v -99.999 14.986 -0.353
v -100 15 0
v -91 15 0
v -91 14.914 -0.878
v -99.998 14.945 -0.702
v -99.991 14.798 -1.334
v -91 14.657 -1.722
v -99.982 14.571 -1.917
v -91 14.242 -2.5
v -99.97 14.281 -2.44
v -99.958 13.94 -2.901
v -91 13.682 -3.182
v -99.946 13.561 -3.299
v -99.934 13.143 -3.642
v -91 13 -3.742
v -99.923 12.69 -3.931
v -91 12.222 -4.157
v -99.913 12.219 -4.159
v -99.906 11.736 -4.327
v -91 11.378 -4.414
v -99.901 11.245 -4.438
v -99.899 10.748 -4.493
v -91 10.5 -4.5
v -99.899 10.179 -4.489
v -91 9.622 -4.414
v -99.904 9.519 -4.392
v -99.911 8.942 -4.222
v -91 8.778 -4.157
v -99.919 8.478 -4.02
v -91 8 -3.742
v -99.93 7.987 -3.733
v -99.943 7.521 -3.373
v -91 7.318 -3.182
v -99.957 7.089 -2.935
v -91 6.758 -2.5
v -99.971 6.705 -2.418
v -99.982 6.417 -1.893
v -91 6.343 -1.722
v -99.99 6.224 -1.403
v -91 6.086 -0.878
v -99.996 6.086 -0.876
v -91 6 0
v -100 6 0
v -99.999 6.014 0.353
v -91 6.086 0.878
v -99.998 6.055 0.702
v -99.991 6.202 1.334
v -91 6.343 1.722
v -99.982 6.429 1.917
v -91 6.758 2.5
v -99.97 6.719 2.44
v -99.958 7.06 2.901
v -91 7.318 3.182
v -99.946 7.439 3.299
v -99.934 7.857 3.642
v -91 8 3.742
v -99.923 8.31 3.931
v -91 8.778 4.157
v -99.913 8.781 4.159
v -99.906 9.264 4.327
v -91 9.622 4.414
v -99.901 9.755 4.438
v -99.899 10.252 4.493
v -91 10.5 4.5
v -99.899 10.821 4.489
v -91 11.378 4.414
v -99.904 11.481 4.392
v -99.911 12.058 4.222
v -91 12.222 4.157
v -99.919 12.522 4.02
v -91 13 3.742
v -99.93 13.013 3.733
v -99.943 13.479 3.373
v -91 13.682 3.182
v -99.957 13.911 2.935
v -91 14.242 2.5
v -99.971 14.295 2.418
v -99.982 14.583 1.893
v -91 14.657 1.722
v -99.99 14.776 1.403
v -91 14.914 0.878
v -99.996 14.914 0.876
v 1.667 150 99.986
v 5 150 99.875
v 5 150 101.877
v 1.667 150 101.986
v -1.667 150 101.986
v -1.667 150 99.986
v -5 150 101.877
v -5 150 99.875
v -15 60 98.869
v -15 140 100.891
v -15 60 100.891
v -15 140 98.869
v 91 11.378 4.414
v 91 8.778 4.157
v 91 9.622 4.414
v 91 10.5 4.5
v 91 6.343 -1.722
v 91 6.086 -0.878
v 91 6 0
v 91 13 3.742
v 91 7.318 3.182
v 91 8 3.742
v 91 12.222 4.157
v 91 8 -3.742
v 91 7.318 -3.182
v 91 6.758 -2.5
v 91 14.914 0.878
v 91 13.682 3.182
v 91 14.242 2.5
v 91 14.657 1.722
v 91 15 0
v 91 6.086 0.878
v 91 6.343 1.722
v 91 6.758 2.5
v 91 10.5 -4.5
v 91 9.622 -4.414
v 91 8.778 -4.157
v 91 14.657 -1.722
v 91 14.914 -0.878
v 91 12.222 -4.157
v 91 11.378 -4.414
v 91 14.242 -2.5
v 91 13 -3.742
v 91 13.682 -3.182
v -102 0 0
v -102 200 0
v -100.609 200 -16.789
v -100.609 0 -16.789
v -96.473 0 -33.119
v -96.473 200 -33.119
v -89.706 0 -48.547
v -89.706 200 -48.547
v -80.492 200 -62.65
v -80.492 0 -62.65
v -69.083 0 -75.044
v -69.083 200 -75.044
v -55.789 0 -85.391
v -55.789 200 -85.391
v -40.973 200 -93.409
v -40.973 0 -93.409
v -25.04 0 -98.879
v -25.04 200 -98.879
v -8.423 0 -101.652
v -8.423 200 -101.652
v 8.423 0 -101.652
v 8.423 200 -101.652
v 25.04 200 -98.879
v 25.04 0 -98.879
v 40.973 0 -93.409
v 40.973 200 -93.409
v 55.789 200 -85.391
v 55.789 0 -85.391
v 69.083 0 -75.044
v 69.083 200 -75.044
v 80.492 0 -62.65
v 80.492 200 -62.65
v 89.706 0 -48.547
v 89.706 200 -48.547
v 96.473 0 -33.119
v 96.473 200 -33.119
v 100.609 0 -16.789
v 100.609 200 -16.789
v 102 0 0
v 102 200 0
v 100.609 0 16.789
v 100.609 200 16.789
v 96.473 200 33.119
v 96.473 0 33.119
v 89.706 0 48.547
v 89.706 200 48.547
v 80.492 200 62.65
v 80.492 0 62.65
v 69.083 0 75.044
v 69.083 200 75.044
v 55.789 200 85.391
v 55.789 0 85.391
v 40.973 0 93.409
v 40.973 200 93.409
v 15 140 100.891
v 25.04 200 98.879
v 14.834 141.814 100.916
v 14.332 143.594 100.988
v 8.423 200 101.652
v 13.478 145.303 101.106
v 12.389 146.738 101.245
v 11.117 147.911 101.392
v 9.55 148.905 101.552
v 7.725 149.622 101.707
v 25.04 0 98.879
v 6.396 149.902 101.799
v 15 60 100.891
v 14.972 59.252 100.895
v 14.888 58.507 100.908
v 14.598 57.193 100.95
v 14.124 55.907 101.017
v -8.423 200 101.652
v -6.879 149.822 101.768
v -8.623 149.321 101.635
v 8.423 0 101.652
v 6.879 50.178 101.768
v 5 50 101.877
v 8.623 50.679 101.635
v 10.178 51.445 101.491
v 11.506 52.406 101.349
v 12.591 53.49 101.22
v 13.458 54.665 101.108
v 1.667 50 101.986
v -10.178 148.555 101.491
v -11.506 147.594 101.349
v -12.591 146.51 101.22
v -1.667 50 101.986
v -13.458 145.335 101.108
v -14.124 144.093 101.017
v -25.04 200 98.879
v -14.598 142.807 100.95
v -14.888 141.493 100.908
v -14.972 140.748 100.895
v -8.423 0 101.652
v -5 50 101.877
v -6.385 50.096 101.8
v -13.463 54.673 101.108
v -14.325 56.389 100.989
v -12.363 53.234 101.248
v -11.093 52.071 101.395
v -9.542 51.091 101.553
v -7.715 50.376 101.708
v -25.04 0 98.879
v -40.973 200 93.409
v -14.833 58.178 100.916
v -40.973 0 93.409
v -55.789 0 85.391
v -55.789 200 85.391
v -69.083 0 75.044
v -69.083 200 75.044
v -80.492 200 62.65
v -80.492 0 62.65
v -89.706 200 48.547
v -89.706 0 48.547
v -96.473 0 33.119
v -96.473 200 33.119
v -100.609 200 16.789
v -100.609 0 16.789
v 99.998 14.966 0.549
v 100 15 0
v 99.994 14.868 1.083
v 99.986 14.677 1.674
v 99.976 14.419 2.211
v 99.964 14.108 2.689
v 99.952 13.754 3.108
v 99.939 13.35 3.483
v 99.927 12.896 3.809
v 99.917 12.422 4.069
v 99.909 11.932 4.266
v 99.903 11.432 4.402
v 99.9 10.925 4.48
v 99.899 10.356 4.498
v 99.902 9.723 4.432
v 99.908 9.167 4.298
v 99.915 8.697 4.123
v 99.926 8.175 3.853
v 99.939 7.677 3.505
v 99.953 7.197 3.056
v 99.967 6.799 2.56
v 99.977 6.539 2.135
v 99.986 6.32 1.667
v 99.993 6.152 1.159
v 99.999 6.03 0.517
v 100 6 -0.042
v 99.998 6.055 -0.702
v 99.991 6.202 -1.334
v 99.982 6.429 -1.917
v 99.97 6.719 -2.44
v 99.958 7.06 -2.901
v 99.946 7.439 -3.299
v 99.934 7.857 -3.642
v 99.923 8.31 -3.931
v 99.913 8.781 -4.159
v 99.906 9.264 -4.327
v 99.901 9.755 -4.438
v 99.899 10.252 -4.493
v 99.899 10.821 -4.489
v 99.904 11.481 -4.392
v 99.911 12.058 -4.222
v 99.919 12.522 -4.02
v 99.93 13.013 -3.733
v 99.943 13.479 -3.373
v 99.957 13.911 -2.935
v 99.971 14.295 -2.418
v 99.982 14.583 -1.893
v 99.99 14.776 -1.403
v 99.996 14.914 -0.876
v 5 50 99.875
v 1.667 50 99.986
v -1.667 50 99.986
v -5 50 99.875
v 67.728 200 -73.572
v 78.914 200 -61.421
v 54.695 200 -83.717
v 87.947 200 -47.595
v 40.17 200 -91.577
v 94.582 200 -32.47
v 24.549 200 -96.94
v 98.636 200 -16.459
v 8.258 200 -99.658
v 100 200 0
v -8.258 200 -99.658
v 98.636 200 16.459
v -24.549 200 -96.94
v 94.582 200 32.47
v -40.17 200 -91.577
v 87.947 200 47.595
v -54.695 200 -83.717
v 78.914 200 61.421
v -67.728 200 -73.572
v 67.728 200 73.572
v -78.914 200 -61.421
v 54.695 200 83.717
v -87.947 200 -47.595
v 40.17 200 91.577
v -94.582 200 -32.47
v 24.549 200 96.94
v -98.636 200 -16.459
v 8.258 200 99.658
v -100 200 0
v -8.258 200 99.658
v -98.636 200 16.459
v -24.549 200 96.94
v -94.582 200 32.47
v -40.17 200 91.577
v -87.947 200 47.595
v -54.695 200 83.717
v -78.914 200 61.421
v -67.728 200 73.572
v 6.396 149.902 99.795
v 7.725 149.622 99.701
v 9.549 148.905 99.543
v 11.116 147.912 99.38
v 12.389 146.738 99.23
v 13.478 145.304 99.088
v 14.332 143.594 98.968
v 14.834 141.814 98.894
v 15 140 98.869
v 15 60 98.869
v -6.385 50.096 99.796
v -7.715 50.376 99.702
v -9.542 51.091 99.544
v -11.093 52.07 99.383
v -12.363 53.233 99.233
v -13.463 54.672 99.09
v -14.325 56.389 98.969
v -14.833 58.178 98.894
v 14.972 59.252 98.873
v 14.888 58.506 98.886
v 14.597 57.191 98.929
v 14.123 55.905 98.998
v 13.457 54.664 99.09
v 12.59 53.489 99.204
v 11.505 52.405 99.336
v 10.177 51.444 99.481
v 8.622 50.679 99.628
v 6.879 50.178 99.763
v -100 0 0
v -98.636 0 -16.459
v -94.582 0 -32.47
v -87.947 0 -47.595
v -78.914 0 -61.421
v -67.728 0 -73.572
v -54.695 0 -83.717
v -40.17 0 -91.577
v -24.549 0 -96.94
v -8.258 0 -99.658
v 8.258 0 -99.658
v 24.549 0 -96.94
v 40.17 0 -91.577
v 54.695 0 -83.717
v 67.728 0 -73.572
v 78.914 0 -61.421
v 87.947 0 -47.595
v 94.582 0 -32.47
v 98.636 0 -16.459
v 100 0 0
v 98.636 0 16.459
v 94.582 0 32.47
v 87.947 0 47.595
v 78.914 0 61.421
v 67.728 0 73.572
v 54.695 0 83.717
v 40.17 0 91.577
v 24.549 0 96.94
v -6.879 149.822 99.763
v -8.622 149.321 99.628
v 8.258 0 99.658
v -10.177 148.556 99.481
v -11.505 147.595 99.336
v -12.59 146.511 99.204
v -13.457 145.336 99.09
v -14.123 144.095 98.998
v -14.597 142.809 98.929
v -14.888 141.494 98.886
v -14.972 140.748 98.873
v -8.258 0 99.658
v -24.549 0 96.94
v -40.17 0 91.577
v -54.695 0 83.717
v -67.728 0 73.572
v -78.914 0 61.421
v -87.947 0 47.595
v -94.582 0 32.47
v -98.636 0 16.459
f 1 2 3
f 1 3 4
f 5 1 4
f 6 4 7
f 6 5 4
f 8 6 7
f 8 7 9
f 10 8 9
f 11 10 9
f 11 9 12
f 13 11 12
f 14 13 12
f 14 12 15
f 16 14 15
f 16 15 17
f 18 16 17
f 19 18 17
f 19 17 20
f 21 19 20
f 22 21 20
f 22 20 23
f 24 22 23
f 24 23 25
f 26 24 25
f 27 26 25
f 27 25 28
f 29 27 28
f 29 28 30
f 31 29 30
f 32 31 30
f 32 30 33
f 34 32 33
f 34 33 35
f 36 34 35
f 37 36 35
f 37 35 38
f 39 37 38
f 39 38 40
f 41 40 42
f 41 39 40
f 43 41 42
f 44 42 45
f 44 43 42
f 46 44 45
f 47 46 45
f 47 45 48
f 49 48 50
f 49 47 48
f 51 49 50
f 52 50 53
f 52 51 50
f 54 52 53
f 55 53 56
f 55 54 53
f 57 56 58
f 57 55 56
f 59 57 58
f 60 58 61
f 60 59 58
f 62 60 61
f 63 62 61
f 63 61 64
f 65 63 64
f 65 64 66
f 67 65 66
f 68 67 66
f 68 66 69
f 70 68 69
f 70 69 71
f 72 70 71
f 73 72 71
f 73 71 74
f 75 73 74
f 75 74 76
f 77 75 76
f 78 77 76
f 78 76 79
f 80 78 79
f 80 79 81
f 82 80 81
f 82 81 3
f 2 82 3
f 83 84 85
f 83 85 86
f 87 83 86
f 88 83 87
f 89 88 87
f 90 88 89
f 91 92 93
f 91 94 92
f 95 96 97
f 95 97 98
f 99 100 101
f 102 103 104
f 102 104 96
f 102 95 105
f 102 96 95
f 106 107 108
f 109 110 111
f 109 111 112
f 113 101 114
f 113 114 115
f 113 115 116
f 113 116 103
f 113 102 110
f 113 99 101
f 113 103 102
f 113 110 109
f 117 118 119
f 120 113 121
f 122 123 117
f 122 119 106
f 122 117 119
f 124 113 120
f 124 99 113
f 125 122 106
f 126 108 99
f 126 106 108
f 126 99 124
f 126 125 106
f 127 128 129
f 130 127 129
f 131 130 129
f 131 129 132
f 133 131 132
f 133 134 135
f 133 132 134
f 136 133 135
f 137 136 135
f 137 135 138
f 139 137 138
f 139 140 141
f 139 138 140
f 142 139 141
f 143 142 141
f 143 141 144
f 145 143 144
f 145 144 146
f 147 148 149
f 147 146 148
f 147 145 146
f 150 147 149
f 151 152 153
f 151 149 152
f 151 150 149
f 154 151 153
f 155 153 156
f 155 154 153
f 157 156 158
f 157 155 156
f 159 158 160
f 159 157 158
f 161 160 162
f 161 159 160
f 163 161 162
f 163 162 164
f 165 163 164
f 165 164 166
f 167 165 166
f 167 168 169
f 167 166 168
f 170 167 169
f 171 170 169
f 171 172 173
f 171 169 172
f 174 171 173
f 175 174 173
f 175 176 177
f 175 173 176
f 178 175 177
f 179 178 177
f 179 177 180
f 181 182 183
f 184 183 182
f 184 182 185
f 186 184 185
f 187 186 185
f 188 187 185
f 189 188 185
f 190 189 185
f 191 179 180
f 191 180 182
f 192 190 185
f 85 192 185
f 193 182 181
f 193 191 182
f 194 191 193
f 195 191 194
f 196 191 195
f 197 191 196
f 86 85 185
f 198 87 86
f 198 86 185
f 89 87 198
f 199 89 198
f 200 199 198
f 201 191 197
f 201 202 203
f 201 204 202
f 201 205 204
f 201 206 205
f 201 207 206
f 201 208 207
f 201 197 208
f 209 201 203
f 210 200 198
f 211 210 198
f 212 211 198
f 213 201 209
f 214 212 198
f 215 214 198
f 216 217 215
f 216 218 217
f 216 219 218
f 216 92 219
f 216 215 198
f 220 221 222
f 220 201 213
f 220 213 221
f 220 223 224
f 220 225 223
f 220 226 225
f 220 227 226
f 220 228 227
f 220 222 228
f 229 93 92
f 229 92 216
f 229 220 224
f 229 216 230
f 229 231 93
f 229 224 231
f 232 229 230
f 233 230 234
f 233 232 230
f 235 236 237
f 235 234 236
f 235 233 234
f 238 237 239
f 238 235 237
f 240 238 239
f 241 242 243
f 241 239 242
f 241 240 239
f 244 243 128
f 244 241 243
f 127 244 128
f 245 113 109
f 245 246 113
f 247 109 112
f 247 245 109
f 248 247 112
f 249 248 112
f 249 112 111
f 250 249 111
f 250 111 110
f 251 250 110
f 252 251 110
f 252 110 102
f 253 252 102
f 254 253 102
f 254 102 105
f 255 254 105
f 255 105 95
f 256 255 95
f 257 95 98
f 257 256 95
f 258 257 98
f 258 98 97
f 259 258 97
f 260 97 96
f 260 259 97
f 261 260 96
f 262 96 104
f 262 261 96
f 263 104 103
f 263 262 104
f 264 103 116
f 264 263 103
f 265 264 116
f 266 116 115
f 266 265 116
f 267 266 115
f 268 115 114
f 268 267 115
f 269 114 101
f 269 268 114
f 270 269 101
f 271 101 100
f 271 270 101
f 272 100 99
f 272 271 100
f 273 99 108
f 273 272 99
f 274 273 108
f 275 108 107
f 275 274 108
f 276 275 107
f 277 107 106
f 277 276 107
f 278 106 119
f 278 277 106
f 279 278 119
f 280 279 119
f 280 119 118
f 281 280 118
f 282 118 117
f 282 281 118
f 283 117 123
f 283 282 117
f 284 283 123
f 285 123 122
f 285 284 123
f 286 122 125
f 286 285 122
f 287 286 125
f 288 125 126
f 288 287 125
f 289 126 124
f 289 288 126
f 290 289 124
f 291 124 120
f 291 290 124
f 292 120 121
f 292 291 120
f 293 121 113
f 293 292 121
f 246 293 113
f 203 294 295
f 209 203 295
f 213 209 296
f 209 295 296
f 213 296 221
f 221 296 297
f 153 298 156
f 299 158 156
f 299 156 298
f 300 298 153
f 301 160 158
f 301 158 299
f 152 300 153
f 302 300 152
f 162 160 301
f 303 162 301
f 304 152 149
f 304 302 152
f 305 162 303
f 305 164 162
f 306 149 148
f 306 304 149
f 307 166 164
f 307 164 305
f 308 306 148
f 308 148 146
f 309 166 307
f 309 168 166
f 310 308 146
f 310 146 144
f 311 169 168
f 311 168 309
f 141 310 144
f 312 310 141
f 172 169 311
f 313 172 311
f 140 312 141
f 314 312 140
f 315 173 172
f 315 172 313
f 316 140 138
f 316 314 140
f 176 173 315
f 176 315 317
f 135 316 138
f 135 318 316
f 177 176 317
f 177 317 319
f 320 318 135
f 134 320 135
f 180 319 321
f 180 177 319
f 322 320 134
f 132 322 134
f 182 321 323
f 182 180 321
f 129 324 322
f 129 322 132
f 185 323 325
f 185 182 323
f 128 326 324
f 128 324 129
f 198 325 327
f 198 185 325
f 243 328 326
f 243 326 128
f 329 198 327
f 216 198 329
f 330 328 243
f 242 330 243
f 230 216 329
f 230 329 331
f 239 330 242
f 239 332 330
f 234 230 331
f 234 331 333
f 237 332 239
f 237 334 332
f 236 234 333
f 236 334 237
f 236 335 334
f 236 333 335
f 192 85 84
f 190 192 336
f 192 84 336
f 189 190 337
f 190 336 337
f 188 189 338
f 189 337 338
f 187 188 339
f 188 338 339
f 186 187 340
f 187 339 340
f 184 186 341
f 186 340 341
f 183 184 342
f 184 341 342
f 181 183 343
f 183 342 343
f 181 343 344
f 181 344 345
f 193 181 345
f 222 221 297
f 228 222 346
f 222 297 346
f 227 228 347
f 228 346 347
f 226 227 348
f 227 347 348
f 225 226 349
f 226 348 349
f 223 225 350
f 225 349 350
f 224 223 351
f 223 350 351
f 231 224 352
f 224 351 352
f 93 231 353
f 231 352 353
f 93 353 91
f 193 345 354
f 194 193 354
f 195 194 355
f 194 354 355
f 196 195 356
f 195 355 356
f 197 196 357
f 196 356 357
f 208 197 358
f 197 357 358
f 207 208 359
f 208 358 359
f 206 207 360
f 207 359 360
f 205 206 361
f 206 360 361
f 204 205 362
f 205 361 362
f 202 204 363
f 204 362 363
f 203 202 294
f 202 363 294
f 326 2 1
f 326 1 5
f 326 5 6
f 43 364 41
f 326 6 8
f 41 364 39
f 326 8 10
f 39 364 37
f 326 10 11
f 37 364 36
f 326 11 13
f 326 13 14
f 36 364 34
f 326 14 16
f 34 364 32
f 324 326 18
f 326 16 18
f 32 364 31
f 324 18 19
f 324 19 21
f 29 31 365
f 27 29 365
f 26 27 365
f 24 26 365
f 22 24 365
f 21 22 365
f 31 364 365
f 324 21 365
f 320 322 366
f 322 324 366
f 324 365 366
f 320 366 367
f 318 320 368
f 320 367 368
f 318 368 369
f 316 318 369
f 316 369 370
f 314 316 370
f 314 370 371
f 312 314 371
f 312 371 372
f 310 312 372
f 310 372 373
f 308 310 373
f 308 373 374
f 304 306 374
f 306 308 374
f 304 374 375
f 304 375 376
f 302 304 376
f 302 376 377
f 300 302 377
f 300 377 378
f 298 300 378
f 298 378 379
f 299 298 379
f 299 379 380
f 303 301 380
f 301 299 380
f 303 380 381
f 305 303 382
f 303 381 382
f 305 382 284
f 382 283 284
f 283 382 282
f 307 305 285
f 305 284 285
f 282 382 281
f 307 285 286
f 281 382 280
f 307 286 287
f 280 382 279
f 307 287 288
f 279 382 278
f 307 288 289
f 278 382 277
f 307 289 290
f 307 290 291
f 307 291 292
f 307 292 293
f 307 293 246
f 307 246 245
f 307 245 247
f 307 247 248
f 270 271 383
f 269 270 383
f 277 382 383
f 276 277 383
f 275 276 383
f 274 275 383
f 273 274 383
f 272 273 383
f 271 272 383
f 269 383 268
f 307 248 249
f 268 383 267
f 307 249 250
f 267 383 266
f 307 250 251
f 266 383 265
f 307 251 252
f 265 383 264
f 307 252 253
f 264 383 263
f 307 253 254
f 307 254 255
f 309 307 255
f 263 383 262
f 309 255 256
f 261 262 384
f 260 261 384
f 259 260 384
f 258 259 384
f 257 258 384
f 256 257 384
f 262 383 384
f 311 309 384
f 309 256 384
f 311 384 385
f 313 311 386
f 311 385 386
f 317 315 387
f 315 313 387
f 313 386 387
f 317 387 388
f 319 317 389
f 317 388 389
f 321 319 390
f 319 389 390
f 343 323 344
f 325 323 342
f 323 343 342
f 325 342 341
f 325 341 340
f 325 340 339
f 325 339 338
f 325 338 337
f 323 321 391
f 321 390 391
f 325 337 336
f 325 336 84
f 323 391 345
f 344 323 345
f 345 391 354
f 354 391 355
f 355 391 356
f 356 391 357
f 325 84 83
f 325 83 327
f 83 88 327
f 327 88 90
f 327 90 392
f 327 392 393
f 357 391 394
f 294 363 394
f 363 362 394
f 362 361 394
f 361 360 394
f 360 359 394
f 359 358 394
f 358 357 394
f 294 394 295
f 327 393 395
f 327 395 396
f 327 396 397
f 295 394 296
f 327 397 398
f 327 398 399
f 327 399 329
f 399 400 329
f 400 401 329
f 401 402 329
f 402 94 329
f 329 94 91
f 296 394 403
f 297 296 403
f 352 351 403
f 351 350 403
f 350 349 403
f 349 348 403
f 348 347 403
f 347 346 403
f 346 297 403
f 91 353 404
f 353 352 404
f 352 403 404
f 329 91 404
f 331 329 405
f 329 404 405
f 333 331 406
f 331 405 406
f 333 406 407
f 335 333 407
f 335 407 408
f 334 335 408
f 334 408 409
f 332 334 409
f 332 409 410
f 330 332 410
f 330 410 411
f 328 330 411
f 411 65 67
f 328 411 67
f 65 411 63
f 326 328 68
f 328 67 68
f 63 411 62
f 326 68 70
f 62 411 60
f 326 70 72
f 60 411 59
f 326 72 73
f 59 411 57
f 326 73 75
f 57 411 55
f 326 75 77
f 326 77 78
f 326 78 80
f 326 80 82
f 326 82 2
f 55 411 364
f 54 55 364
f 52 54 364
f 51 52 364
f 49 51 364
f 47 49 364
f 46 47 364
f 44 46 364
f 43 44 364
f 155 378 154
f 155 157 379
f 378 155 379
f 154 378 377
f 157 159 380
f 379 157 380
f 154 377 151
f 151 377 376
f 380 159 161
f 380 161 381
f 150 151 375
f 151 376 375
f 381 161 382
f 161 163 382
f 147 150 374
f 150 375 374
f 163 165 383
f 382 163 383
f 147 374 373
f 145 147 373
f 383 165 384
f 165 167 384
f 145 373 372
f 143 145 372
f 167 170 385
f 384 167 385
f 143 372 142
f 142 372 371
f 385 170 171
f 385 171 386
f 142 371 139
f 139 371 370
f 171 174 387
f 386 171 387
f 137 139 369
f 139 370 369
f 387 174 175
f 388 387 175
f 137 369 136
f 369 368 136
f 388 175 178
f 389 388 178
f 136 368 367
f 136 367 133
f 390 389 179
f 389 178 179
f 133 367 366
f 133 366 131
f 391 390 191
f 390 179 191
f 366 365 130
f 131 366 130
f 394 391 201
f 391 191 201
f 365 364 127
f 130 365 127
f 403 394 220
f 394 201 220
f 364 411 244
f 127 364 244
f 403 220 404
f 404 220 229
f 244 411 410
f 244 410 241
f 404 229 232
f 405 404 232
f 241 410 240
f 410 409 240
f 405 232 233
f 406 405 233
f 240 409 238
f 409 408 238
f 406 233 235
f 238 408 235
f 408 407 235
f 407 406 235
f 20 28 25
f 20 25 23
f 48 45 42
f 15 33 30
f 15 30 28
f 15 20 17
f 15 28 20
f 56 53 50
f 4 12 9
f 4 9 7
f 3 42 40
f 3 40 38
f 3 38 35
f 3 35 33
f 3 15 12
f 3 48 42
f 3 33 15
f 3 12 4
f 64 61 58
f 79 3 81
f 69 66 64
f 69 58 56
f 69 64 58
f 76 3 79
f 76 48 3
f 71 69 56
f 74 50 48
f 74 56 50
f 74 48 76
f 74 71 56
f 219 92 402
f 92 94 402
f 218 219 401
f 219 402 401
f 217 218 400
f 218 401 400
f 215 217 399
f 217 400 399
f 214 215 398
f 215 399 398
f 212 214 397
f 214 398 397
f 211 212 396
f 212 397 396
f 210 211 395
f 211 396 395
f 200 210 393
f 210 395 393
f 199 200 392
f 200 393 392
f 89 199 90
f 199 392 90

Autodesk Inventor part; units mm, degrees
ref_plane "XZ Plane" through (0, 0, 0) normal (0, 1, 0) x (-1, 0, 0)
ref_plane "XY Plane" through (0, 0, 0) normal (0, 0, 1) x (1, 0, 0)
sketch "Sketch1" plane through (0, 0, 0) normal (0, 1, 0) x (-1, 0, 0)
  circle A0 centre (0, 0) radius 100
  circle A1 centre (0, 0) radius 102
  dimension "d0" = 200
  dimension "d1" = 2
extrude "Extrusion1" add sketch "Sketch1" along normal blind 200
sketch "Sketch2" plane through (0, 0, 0) normal (0, 0, 1) x (1, 0, 0)
  line L0 (-5, 50) -> (0, 50)
  line L1 (0, 150) -> (-5, 150)
  line L2 (-15, 140) -> (-15, 60)
  line L3 (102, 200) -> (-102, 200) projected
  line L4 (0, 200) -> (0, 0) construction
  line L5 (102, 0) -> (-102, 0) projected
  line L6 (-102, 200) -> (102, 0) construction
  line L7 (102, 200) -> (0, 100) construction
  line L8 (0, 100) -> (-15, 100) construction
  line L9 (5, 50) -> (0, 50)
  line L10 (0, 150) -> (5, 150)
  line L11 (15, 140) -> (15, 60)
  arc A0 (-5, 150) -> (-15, 140) centre (-5, 140) ccw
  arc A1 (15, 140) -> (5, 150) centre (5, 140) ccw
  arc A2 (-15, 60) -> (-5, 50) centre (-5, 60) ccw
  arc A3 (5, 50) -> (15, 60) centre (5, 60) ccw
  point P0 (-15, 50)
  point P1 (-15, 150)
  point P2 (15, 50)
  point P3 (15, 150)
  dimension "d4" = 15
  dimension "d5" = 100
  dimension "d9" = 10
extrude "Extrusion2" cut sketch "Sketch2" along normal through all
ref_plane "Work Plane1" through (-101, 0, 0) normal (1, 0, 0) x (0, 1, 0)
sketch "Sketch3" plane through (-101, 0, 0) normal (1, 0, 0) x (0, 1, 0)
  circle A0 centre (10.5, 0) radius 4.5
  line L0 (0, 0) -> (200, 0) construction
  line L1 (200, -102) -> (200, 102) projected
  dimension "d11" = 9
  dimension "d12" = 10.5
extrude "Extrusion3" add sketch "Sketch3" along normal blind 10
pattern_circular "Circular Pattern1" count 2 over 360 about axis through (0, 0, 0) along (0, 1, 0) of "Extrusion3"
properties part number "cover"
